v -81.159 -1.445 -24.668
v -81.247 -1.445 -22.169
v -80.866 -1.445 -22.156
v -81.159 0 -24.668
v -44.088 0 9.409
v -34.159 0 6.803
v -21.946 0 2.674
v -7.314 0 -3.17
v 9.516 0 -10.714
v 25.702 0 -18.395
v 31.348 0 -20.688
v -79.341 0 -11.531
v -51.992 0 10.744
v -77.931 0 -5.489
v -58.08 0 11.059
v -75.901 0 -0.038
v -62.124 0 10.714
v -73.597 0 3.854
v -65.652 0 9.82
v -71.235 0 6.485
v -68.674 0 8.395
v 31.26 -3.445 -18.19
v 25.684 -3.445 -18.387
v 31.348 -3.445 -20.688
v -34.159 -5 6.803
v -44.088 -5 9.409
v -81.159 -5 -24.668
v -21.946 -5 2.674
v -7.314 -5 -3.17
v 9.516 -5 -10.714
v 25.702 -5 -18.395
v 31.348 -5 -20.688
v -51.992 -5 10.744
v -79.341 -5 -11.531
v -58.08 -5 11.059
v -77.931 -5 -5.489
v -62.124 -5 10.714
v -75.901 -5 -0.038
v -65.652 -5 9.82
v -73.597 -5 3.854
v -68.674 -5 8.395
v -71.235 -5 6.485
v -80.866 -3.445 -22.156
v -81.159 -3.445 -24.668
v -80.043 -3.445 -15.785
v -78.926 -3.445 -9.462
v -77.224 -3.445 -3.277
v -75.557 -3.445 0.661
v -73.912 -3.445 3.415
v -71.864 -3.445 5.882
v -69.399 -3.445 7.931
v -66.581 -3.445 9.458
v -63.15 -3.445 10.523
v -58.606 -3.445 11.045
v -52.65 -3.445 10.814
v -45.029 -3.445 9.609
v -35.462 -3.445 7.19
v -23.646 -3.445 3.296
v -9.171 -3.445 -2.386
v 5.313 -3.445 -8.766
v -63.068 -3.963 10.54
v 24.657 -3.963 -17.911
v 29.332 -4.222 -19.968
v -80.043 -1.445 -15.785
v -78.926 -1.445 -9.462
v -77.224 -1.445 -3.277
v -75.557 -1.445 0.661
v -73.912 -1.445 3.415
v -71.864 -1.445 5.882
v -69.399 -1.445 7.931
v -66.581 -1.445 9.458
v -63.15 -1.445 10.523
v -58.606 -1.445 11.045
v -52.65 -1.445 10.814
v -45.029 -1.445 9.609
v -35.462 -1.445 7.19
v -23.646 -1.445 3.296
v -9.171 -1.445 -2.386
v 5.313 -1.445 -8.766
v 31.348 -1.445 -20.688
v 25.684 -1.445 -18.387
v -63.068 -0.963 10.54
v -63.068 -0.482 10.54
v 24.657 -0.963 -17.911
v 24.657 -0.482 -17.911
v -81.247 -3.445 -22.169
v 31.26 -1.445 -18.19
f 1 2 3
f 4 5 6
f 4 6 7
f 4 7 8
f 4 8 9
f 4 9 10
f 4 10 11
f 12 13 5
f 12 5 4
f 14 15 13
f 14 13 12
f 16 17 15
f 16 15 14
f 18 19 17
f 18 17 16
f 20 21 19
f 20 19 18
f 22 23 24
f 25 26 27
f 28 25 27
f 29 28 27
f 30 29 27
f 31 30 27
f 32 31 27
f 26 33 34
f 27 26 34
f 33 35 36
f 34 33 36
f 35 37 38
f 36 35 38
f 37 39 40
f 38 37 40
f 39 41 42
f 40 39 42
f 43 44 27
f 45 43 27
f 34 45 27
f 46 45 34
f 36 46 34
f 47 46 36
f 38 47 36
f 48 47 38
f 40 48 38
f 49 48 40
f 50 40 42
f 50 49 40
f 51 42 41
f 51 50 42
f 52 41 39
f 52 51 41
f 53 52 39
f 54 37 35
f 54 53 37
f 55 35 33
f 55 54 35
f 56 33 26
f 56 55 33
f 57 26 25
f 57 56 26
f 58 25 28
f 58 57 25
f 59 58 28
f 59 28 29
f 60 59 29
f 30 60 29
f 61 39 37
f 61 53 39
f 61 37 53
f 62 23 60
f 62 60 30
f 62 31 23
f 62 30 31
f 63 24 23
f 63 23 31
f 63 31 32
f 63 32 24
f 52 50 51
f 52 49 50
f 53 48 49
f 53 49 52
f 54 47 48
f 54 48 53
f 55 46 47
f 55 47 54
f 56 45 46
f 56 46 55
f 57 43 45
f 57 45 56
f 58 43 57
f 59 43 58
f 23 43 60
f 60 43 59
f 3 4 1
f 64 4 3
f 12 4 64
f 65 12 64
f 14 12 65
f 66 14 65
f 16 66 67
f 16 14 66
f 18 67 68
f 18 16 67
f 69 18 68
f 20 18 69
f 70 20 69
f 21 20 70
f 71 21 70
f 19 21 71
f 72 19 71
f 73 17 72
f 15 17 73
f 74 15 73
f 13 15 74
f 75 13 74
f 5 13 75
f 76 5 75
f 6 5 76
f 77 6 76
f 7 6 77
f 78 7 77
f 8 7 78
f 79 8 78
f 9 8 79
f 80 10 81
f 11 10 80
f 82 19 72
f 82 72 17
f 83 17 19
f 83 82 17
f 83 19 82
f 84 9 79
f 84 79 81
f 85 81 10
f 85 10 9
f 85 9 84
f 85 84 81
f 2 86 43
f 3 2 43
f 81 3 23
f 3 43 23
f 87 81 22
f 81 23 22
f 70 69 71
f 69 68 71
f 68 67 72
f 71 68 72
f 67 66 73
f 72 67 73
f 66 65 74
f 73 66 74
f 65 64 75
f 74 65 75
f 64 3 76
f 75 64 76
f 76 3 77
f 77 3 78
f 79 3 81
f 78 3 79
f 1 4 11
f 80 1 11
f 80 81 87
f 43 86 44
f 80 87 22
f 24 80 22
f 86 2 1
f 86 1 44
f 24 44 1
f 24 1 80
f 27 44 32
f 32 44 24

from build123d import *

# Parameters (mm, degrees)
F1_DEPTH = 5
F2_W     = 112.5773771023
F2_H     = 2
F3_DEPTH = 60.198
F4_DEPTH = 2.5


with BuildPart() as f1:
    # F0 (on Front) → F1 (new body)
    with BuildSketch(Plane.XZ):
        with BuildLine():
            add(Edge.make_bspline(
                [(-81.1586976051, -24.6675647795), (-79.2960930719, -8.5493928656), (-74.5904224448, 32.1714401323), (24.2241178131, -18.3339028992), (30.068828254, -20.2652569227), (31.3483215868, -20.6880588084)],
                knots=[0, 0, 0, 0, 0.3385017071, 0.8551882657, 1, 1, 1, 1], degree=3))
            Line((-81.1586976051, -24.6675647795), (31.3483215868, -20.6880588084))
        make_face()
    extrude(amount=F1_DEPTH)

    # F2 (on face) → F3 (cut)
    with BuildSketch(Plane(origin=(0.770018179, 0, -21.7696494672), x_dir=(0.9993750262, 0, 0.0353490734), z_dir=(0.0353490734, 0, -0.9993750262))):
        with Locations((-25.6912625539, 2.4448475558)):
            Rectangle(F2_W, F2_H)
    extrude(amount=-F3_DEPTH, mode=Mode.SUBTRACT)

    # F2 (on face) → F4 (join)
    with BuildSketch(Plane(origin=(0.770018179, 0, -21.7696494672), x_dir=(0.9993750262, 0, 0.0353490734), z_dir=(0.0353490734, 0, -0.9993750262))):
        with Locations((-25.6912625539, 2.4448475558)):
            Rectangle(F2_W, F2_H)
    extrude(amount=-F4_DEPTH)


solid = f1.part
